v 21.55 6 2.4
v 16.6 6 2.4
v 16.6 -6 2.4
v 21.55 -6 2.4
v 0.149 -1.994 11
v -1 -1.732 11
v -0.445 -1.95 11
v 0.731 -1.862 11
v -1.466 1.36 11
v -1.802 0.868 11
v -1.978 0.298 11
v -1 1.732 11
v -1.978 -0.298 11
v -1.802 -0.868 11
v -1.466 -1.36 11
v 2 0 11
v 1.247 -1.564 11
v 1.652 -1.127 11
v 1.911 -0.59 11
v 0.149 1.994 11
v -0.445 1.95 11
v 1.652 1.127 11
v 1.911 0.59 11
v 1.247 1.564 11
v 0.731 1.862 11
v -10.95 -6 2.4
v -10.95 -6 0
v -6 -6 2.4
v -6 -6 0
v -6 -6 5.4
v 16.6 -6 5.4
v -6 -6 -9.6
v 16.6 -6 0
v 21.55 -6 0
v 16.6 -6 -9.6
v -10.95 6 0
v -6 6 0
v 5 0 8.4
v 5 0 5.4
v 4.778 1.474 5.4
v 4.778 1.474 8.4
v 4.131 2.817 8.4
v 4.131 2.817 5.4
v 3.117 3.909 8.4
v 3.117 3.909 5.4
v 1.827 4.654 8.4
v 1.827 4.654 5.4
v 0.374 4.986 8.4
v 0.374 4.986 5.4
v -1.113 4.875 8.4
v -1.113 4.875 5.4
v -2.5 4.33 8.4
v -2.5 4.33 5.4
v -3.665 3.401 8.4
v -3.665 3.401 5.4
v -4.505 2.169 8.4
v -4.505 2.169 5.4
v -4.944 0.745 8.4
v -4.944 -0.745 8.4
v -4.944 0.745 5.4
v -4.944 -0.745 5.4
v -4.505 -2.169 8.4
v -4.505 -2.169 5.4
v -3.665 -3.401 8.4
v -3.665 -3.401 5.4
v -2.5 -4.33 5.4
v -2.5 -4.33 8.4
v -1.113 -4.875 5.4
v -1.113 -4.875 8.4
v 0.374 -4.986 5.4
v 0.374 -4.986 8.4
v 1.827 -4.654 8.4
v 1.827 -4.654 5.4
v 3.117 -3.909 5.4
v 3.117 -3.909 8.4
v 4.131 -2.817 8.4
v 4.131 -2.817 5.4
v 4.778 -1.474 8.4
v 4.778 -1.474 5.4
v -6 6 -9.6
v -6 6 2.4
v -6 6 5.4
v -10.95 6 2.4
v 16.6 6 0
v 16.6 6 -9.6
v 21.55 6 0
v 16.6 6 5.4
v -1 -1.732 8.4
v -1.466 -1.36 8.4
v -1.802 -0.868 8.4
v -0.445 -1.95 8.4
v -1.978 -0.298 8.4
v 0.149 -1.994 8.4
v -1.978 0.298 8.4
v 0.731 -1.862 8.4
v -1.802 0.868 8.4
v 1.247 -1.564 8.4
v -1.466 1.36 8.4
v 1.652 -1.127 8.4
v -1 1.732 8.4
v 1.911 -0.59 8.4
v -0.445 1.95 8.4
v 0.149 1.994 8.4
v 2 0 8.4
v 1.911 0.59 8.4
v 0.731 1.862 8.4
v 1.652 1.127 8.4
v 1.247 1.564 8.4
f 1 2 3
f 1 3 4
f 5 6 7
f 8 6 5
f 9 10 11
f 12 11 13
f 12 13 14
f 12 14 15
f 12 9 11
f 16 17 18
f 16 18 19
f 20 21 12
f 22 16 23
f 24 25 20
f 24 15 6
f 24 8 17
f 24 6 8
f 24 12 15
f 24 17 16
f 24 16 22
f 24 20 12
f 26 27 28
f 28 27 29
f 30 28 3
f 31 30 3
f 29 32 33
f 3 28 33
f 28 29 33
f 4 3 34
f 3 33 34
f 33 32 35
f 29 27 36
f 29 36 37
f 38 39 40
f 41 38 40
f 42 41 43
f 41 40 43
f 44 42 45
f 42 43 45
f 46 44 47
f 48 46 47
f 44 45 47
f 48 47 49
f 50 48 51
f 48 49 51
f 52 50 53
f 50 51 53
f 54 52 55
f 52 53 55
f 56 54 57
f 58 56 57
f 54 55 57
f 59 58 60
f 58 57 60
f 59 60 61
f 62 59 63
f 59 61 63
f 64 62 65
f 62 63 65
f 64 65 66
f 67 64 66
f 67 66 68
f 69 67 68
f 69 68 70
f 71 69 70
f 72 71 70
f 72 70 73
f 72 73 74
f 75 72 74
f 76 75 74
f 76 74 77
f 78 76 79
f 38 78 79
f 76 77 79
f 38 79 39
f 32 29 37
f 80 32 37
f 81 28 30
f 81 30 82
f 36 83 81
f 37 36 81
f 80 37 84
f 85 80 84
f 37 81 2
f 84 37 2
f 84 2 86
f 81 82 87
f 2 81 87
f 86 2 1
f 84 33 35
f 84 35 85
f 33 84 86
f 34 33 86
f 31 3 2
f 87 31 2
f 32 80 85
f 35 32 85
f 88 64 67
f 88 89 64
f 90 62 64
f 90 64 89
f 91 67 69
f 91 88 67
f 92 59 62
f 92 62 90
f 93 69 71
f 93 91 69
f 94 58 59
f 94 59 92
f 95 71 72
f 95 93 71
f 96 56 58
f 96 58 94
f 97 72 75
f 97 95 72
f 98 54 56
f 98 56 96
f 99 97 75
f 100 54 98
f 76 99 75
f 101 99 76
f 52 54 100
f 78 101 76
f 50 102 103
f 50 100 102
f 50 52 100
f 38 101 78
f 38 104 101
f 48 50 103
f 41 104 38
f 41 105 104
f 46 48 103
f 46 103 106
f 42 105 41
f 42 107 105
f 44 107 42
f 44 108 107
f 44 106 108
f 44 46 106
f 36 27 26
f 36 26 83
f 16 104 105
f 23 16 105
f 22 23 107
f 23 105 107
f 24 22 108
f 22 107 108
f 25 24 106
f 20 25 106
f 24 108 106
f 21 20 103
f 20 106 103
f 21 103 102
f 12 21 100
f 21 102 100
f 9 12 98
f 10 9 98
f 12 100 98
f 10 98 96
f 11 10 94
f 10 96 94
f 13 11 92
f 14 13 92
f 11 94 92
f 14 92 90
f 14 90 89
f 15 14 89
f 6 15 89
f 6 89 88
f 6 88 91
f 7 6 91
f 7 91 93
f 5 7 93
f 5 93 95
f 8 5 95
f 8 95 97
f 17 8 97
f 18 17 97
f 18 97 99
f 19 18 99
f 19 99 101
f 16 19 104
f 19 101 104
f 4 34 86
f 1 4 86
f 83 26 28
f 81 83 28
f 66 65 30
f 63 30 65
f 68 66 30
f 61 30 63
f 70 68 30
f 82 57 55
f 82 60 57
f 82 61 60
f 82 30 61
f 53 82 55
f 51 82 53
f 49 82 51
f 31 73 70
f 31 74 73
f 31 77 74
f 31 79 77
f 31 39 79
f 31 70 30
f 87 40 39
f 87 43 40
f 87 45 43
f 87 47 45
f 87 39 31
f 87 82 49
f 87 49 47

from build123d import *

# Parameters (mm, degrees)
F0_W          = 32.5
F0_H          = 12
F1_DEPTH      = 2.4
F2_W          = 22.6
F2_H          = 12
F3_DEPTH      = 3
F3_DEPTH_BACK = 12
F4_R          = 5
F5_DEPTH      = 3
F6_R          = 2
F7_DEPTH      = 2.6


with BuildPart() as f1:
    # F0 (on Top) → F1 (new body)
    with BuildSketch(Plane.XY):
        with Locations((5.3, 0)):
            Rectangle(F0_W, F0_H)
    extrude(amount=F1_DEPTH)

    # F2 (on face) → F3 (join, two sides)
    with BuildSketch(Plane.XY.offset(2.4)) as f3_sk:
        with Locations((5.3, 0)):
            Rectangle(F2_W, F2_H)
    extrude(amount=F3_DEPTH)
    extrude(f3_sk.sketch, amount=-F3_DEPTH_BACK)

    # F4 (on face) → F5 (join)
    with BuildSketch(Plane.XY.offset(5.4)):
        Circle(F4_R)
    extrude(amount=F5_DEPTH)

    # F6 (on face) → F7 (join)
    with BuildSketch(Plane.XY.offset(8.4)):
        Circle(F6_R)
    extrude(amount=F7_DEPTH)


solid = f1.part
